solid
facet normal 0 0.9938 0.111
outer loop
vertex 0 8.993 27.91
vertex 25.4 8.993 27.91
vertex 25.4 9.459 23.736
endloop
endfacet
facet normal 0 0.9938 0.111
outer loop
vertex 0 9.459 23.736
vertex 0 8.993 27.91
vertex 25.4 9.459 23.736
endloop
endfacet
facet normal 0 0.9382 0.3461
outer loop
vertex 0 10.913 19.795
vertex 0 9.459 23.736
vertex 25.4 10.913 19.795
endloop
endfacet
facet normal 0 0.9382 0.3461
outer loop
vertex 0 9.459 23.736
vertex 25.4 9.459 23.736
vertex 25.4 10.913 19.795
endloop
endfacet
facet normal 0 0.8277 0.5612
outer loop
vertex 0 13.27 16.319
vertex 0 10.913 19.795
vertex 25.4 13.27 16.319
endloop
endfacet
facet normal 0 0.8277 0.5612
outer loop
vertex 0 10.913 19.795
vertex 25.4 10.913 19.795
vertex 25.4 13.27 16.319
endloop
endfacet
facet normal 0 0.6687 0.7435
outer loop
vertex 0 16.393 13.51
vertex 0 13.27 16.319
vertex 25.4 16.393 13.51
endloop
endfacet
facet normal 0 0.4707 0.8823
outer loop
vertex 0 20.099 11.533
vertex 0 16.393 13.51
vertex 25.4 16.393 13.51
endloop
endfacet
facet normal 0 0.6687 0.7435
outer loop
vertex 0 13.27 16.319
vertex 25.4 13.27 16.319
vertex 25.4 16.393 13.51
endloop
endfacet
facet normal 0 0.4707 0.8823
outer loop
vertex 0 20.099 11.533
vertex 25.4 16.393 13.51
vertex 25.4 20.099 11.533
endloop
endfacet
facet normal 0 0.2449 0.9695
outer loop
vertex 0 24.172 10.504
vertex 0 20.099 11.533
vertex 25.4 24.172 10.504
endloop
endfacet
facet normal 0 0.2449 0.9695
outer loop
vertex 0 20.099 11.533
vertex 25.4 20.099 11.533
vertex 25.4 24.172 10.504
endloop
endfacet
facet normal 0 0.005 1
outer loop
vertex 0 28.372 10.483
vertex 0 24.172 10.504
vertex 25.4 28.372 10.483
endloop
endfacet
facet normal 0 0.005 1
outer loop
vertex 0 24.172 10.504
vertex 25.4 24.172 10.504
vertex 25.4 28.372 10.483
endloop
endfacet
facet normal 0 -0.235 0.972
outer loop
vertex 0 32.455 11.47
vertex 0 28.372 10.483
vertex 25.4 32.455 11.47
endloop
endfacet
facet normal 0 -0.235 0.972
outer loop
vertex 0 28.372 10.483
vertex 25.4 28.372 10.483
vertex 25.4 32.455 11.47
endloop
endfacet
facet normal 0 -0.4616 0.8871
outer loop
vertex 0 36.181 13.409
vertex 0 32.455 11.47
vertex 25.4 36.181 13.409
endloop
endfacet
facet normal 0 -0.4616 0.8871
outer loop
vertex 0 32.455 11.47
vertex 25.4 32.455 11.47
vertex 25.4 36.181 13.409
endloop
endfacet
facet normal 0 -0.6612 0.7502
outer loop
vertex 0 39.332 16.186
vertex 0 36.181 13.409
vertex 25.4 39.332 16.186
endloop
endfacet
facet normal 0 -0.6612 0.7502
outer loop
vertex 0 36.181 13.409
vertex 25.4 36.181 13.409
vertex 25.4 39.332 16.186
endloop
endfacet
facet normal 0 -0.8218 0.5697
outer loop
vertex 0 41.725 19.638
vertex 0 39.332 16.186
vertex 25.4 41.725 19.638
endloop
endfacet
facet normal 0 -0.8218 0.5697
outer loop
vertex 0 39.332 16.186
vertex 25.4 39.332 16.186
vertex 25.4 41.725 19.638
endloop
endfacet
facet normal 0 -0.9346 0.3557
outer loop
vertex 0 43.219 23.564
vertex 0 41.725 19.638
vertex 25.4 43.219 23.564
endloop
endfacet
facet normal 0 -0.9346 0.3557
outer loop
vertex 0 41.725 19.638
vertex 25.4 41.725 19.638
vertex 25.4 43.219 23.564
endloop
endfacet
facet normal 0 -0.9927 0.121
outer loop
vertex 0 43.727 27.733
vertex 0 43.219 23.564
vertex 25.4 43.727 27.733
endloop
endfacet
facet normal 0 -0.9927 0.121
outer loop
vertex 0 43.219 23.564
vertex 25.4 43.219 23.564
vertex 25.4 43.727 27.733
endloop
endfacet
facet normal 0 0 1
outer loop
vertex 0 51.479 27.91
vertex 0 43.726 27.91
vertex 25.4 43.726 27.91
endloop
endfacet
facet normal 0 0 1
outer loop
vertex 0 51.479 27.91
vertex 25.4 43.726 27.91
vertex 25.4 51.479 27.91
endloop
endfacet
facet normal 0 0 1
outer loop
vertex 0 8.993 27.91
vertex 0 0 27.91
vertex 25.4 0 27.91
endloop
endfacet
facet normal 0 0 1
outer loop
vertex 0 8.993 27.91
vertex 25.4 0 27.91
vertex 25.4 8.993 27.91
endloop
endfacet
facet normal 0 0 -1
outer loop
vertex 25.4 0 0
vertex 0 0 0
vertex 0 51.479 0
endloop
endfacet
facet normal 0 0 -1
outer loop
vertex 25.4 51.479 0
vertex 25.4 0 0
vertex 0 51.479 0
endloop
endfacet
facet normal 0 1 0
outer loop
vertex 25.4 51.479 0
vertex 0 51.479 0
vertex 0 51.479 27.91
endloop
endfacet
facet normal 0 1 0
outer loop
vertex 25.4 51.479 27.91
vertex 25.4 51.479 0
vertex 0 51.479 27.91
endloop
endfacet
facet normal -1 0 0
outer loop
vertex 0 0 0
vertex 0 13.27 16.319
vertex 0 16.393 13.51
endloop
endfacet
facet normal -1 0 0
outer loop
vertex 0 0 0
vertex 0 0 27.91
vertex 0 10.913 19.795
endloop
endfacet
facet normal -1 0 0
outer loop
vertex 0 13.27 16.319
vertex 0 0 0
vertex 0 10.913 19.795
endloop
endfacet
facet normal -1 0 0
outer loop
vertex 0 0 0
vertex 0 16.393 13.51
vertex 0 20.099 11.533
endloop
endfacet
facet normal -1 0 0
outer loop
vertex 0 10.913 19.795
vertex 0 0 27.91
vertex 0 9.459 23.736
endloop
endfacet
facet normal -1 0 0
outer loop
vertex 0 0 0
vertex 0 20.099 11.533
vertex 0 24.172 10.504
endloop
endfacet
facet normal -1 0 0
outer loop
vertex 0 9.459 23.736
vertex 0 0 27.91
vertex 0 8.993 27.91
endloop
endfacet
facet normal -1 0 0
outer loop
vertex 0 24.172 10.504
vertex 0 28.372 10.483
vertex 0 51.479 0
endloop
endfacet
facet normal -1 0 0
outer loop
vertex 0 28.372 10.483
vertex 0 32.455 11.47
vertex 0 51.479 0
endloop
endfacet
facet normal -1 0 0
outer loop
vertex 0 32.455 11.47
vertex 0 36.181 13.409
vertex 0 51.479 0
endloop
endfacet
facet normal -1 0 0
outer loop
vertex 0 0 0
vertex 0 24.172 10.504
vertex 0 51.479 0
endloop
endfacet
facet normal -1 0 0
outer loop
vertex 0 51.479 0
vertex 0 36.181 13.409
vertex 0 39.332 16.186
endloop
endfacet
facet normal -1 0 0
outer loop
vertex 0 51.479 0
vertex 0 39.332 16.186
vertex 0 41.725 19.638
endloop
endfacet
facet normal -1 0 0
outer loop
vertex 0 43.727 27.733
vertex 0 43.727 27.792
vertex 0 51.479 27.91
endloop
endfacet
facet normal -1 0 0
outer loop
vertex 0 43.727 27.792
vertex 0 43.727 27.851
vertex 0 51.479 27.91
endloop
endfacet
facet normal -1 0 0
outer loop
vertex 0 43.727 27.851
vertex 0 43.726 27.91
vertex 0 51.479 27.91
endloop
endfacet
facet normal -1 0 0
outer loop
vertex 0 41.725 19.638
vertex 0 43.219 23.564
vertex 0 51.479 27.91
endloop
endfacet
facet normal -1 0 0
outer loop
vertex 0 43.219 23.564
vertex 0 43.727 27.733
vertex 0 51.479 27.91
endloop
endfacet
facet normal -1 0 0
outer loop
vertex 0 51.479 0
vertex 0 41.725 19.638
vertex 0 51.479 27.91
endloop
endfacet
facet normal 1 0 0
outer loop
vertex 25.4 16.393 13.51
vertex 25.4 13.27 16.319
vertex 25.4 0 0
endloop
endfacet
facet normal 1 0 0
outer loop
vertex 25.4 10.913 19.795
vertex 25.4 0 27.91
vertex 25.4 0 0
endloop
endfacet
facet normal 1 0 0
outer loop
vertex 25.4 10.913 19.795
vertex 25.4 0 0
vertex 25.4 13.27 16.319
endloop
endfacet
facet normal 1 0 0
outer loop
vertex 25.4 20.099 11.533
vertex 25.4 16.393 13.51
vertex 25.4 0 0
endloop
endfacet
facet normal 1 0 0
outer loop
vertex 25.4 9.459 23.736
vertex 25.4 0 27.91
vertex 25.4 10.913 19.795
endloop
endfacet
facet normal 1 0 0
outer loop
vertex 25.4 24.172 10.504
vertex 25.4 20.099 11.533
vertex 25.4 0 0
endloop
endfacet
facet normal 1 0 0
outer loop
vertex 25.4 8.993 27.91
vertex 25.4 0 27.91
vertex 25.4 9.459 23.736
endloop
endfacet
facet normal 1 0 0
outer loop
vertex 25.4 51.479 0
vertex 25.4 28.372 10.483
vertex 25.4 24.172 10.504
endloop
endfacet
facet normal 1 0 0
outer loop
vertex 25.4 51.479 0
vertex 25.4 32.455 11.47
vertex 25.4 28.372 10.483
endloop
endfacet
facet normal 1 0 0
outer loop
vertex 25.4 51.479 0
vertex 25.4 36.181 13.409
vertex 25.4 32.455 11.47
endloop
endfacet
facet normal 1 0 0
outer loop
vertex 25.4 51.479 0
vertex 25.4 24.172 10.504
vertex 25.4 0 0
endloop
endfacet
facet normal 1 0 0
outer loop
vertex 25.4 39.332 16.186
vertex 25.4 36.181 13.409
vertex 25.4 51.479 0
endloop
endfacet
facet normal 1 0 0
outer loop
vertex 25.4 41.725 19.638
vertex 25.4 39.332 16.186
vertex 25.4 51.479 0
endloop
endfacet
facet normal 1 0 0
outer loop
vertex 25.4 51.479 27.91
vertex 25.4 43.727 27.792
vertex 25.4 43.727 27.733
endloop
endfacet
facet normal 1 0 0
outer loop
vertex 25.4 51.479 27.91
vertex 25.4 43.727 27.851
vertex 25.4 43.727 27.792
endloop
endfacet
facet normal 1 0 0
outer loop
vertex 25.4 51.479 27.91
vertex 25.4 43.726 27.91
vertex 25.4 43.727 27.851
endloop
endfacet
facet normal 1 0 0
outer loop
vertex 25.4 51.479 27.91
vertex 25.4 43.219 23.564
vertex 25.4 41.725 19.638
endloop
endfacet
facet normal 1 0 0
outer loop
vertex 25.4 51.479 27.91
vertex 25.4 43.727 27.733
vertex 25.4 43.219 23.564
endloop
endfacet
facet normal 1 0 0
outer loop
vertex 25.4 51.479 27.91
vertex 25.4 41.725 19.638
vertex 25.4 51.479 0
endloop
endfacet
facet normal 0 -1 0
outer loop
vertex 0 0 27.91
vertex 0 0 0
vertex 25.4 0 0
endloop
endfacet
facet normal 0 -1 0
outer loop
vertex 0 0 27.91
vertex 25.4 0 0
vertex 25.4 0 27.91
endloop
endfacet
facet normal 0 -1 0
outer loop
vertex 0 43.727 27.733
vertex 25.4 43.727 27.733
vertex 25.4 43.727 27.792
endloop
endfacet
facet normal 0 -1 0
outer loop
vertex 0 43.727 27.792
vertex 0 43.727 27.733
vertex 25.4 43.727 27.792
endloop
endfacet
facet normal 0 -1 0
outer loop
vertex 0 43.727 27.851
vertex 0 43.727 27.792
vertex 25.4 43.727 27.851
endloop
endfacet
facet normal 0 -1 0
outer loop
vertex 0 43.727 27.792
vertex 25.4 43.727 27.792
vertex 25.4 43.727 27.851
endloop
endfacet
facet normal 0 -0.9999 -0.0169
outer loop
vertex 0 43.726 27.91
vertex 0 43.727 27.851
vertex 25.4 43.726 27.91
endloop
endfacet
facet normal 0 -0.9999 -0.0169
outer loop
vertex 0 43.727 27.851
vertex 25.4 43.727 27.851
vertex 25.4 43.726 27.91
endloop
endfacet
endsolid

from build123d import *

# Parameters (mm, degrees)
F0_W     = 51.479302
F0_H     = 27.910465
F1_DEPTH = 25.4
F3_DEPTH = 25.4


with BuildPart() as f1:
    # F0 (on Right) → F1 (new body)
    with BuildSketch(Plane.YZ):
        with Locations((25.739651, 13.955232)):
            Rectangle(F0_W, F0_H)
    extrude(amount=F1_DEPTH)

    # F2 (on face) → F3 (cut)
    with BuildSketch(Plane.YZ.offset(25.4)):
        with BuildLine():
            ThreePointArc((8.993372, 27.910465), (26.271278, 10.366066), (43.7273, 27.733256))
            ThreePointArc((43.7273, 27.733256), (43.727074, 27.821862), (43.726396, 27.910465))
            Line((43.726396, 27.910465), (8.993372, 27.910465))
        make_face()
        with BuildLine():
            Line((8.993372, 27.910465), (43.726396, 27.910465))
            ThreePointArc((43.726396, 27.910465), (26.359884, 45.100672), (8.993372, 27.910465))
        make_face()
    extrude(amount=-F3_DEPTH, mode=Mode.SUBTRACT)


solid = f1.part
